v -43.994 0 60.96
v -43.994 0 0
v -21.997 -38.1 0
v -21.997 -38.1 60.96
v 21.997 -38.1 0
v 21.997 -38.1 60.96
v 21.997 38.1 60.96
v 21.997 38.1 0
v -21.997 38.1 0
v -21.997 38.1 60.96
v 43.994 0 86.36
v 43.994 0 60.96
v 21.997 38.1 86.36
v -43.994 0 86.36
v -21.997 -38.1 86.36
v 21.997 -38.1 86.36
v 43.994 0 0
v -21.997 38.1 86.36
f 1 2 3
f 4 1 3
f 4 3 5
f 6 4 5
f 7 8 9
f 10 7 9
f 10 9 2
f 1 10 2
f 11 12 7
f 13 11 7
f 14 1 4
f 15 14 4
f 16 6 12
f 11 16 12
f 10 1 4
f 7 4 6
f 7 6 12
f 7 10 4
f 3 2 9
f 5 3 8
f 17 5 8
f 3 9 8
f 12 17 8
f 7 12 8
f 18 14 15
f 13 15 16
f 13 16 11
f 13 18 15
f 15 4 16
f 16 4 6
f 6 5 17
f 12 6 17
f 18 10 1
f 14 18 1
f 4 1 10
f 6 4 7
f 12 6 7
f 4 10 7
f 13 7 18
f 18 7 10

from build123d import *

# Parameters (mm, degrees)
F1_DEPTH = 60.96
F2_DEPTH = 25.4


with BuildPart() as f1:
    # F0 (on Top) → F1 (new body)
    with BuildSketch(Plane.XY):
        Polygon((21.997045, 38.1), (-21.997045, 38.1), (-43.994091, 0), (-21.997045, -38.1), (21.997045, -38.1), (43.994091, 0), align=None)
    extrude(amount=F1_DEPTH)


with BuildPart() as f2:
    # F1_face (on face) → F2 (new body)
    with BuildSketch(Plane.XY.offset(60.96)):
        Polygon((21.997045, 38.1), (-21.997045, 38.1), (-43.994091, 0), (-21.997045, -38.1), (21.997045, -38.1), (43.994091, 0), align=None)
    extrude(amount=F2_DEPTH)


solid = Compound([f1.part, f2.part])
